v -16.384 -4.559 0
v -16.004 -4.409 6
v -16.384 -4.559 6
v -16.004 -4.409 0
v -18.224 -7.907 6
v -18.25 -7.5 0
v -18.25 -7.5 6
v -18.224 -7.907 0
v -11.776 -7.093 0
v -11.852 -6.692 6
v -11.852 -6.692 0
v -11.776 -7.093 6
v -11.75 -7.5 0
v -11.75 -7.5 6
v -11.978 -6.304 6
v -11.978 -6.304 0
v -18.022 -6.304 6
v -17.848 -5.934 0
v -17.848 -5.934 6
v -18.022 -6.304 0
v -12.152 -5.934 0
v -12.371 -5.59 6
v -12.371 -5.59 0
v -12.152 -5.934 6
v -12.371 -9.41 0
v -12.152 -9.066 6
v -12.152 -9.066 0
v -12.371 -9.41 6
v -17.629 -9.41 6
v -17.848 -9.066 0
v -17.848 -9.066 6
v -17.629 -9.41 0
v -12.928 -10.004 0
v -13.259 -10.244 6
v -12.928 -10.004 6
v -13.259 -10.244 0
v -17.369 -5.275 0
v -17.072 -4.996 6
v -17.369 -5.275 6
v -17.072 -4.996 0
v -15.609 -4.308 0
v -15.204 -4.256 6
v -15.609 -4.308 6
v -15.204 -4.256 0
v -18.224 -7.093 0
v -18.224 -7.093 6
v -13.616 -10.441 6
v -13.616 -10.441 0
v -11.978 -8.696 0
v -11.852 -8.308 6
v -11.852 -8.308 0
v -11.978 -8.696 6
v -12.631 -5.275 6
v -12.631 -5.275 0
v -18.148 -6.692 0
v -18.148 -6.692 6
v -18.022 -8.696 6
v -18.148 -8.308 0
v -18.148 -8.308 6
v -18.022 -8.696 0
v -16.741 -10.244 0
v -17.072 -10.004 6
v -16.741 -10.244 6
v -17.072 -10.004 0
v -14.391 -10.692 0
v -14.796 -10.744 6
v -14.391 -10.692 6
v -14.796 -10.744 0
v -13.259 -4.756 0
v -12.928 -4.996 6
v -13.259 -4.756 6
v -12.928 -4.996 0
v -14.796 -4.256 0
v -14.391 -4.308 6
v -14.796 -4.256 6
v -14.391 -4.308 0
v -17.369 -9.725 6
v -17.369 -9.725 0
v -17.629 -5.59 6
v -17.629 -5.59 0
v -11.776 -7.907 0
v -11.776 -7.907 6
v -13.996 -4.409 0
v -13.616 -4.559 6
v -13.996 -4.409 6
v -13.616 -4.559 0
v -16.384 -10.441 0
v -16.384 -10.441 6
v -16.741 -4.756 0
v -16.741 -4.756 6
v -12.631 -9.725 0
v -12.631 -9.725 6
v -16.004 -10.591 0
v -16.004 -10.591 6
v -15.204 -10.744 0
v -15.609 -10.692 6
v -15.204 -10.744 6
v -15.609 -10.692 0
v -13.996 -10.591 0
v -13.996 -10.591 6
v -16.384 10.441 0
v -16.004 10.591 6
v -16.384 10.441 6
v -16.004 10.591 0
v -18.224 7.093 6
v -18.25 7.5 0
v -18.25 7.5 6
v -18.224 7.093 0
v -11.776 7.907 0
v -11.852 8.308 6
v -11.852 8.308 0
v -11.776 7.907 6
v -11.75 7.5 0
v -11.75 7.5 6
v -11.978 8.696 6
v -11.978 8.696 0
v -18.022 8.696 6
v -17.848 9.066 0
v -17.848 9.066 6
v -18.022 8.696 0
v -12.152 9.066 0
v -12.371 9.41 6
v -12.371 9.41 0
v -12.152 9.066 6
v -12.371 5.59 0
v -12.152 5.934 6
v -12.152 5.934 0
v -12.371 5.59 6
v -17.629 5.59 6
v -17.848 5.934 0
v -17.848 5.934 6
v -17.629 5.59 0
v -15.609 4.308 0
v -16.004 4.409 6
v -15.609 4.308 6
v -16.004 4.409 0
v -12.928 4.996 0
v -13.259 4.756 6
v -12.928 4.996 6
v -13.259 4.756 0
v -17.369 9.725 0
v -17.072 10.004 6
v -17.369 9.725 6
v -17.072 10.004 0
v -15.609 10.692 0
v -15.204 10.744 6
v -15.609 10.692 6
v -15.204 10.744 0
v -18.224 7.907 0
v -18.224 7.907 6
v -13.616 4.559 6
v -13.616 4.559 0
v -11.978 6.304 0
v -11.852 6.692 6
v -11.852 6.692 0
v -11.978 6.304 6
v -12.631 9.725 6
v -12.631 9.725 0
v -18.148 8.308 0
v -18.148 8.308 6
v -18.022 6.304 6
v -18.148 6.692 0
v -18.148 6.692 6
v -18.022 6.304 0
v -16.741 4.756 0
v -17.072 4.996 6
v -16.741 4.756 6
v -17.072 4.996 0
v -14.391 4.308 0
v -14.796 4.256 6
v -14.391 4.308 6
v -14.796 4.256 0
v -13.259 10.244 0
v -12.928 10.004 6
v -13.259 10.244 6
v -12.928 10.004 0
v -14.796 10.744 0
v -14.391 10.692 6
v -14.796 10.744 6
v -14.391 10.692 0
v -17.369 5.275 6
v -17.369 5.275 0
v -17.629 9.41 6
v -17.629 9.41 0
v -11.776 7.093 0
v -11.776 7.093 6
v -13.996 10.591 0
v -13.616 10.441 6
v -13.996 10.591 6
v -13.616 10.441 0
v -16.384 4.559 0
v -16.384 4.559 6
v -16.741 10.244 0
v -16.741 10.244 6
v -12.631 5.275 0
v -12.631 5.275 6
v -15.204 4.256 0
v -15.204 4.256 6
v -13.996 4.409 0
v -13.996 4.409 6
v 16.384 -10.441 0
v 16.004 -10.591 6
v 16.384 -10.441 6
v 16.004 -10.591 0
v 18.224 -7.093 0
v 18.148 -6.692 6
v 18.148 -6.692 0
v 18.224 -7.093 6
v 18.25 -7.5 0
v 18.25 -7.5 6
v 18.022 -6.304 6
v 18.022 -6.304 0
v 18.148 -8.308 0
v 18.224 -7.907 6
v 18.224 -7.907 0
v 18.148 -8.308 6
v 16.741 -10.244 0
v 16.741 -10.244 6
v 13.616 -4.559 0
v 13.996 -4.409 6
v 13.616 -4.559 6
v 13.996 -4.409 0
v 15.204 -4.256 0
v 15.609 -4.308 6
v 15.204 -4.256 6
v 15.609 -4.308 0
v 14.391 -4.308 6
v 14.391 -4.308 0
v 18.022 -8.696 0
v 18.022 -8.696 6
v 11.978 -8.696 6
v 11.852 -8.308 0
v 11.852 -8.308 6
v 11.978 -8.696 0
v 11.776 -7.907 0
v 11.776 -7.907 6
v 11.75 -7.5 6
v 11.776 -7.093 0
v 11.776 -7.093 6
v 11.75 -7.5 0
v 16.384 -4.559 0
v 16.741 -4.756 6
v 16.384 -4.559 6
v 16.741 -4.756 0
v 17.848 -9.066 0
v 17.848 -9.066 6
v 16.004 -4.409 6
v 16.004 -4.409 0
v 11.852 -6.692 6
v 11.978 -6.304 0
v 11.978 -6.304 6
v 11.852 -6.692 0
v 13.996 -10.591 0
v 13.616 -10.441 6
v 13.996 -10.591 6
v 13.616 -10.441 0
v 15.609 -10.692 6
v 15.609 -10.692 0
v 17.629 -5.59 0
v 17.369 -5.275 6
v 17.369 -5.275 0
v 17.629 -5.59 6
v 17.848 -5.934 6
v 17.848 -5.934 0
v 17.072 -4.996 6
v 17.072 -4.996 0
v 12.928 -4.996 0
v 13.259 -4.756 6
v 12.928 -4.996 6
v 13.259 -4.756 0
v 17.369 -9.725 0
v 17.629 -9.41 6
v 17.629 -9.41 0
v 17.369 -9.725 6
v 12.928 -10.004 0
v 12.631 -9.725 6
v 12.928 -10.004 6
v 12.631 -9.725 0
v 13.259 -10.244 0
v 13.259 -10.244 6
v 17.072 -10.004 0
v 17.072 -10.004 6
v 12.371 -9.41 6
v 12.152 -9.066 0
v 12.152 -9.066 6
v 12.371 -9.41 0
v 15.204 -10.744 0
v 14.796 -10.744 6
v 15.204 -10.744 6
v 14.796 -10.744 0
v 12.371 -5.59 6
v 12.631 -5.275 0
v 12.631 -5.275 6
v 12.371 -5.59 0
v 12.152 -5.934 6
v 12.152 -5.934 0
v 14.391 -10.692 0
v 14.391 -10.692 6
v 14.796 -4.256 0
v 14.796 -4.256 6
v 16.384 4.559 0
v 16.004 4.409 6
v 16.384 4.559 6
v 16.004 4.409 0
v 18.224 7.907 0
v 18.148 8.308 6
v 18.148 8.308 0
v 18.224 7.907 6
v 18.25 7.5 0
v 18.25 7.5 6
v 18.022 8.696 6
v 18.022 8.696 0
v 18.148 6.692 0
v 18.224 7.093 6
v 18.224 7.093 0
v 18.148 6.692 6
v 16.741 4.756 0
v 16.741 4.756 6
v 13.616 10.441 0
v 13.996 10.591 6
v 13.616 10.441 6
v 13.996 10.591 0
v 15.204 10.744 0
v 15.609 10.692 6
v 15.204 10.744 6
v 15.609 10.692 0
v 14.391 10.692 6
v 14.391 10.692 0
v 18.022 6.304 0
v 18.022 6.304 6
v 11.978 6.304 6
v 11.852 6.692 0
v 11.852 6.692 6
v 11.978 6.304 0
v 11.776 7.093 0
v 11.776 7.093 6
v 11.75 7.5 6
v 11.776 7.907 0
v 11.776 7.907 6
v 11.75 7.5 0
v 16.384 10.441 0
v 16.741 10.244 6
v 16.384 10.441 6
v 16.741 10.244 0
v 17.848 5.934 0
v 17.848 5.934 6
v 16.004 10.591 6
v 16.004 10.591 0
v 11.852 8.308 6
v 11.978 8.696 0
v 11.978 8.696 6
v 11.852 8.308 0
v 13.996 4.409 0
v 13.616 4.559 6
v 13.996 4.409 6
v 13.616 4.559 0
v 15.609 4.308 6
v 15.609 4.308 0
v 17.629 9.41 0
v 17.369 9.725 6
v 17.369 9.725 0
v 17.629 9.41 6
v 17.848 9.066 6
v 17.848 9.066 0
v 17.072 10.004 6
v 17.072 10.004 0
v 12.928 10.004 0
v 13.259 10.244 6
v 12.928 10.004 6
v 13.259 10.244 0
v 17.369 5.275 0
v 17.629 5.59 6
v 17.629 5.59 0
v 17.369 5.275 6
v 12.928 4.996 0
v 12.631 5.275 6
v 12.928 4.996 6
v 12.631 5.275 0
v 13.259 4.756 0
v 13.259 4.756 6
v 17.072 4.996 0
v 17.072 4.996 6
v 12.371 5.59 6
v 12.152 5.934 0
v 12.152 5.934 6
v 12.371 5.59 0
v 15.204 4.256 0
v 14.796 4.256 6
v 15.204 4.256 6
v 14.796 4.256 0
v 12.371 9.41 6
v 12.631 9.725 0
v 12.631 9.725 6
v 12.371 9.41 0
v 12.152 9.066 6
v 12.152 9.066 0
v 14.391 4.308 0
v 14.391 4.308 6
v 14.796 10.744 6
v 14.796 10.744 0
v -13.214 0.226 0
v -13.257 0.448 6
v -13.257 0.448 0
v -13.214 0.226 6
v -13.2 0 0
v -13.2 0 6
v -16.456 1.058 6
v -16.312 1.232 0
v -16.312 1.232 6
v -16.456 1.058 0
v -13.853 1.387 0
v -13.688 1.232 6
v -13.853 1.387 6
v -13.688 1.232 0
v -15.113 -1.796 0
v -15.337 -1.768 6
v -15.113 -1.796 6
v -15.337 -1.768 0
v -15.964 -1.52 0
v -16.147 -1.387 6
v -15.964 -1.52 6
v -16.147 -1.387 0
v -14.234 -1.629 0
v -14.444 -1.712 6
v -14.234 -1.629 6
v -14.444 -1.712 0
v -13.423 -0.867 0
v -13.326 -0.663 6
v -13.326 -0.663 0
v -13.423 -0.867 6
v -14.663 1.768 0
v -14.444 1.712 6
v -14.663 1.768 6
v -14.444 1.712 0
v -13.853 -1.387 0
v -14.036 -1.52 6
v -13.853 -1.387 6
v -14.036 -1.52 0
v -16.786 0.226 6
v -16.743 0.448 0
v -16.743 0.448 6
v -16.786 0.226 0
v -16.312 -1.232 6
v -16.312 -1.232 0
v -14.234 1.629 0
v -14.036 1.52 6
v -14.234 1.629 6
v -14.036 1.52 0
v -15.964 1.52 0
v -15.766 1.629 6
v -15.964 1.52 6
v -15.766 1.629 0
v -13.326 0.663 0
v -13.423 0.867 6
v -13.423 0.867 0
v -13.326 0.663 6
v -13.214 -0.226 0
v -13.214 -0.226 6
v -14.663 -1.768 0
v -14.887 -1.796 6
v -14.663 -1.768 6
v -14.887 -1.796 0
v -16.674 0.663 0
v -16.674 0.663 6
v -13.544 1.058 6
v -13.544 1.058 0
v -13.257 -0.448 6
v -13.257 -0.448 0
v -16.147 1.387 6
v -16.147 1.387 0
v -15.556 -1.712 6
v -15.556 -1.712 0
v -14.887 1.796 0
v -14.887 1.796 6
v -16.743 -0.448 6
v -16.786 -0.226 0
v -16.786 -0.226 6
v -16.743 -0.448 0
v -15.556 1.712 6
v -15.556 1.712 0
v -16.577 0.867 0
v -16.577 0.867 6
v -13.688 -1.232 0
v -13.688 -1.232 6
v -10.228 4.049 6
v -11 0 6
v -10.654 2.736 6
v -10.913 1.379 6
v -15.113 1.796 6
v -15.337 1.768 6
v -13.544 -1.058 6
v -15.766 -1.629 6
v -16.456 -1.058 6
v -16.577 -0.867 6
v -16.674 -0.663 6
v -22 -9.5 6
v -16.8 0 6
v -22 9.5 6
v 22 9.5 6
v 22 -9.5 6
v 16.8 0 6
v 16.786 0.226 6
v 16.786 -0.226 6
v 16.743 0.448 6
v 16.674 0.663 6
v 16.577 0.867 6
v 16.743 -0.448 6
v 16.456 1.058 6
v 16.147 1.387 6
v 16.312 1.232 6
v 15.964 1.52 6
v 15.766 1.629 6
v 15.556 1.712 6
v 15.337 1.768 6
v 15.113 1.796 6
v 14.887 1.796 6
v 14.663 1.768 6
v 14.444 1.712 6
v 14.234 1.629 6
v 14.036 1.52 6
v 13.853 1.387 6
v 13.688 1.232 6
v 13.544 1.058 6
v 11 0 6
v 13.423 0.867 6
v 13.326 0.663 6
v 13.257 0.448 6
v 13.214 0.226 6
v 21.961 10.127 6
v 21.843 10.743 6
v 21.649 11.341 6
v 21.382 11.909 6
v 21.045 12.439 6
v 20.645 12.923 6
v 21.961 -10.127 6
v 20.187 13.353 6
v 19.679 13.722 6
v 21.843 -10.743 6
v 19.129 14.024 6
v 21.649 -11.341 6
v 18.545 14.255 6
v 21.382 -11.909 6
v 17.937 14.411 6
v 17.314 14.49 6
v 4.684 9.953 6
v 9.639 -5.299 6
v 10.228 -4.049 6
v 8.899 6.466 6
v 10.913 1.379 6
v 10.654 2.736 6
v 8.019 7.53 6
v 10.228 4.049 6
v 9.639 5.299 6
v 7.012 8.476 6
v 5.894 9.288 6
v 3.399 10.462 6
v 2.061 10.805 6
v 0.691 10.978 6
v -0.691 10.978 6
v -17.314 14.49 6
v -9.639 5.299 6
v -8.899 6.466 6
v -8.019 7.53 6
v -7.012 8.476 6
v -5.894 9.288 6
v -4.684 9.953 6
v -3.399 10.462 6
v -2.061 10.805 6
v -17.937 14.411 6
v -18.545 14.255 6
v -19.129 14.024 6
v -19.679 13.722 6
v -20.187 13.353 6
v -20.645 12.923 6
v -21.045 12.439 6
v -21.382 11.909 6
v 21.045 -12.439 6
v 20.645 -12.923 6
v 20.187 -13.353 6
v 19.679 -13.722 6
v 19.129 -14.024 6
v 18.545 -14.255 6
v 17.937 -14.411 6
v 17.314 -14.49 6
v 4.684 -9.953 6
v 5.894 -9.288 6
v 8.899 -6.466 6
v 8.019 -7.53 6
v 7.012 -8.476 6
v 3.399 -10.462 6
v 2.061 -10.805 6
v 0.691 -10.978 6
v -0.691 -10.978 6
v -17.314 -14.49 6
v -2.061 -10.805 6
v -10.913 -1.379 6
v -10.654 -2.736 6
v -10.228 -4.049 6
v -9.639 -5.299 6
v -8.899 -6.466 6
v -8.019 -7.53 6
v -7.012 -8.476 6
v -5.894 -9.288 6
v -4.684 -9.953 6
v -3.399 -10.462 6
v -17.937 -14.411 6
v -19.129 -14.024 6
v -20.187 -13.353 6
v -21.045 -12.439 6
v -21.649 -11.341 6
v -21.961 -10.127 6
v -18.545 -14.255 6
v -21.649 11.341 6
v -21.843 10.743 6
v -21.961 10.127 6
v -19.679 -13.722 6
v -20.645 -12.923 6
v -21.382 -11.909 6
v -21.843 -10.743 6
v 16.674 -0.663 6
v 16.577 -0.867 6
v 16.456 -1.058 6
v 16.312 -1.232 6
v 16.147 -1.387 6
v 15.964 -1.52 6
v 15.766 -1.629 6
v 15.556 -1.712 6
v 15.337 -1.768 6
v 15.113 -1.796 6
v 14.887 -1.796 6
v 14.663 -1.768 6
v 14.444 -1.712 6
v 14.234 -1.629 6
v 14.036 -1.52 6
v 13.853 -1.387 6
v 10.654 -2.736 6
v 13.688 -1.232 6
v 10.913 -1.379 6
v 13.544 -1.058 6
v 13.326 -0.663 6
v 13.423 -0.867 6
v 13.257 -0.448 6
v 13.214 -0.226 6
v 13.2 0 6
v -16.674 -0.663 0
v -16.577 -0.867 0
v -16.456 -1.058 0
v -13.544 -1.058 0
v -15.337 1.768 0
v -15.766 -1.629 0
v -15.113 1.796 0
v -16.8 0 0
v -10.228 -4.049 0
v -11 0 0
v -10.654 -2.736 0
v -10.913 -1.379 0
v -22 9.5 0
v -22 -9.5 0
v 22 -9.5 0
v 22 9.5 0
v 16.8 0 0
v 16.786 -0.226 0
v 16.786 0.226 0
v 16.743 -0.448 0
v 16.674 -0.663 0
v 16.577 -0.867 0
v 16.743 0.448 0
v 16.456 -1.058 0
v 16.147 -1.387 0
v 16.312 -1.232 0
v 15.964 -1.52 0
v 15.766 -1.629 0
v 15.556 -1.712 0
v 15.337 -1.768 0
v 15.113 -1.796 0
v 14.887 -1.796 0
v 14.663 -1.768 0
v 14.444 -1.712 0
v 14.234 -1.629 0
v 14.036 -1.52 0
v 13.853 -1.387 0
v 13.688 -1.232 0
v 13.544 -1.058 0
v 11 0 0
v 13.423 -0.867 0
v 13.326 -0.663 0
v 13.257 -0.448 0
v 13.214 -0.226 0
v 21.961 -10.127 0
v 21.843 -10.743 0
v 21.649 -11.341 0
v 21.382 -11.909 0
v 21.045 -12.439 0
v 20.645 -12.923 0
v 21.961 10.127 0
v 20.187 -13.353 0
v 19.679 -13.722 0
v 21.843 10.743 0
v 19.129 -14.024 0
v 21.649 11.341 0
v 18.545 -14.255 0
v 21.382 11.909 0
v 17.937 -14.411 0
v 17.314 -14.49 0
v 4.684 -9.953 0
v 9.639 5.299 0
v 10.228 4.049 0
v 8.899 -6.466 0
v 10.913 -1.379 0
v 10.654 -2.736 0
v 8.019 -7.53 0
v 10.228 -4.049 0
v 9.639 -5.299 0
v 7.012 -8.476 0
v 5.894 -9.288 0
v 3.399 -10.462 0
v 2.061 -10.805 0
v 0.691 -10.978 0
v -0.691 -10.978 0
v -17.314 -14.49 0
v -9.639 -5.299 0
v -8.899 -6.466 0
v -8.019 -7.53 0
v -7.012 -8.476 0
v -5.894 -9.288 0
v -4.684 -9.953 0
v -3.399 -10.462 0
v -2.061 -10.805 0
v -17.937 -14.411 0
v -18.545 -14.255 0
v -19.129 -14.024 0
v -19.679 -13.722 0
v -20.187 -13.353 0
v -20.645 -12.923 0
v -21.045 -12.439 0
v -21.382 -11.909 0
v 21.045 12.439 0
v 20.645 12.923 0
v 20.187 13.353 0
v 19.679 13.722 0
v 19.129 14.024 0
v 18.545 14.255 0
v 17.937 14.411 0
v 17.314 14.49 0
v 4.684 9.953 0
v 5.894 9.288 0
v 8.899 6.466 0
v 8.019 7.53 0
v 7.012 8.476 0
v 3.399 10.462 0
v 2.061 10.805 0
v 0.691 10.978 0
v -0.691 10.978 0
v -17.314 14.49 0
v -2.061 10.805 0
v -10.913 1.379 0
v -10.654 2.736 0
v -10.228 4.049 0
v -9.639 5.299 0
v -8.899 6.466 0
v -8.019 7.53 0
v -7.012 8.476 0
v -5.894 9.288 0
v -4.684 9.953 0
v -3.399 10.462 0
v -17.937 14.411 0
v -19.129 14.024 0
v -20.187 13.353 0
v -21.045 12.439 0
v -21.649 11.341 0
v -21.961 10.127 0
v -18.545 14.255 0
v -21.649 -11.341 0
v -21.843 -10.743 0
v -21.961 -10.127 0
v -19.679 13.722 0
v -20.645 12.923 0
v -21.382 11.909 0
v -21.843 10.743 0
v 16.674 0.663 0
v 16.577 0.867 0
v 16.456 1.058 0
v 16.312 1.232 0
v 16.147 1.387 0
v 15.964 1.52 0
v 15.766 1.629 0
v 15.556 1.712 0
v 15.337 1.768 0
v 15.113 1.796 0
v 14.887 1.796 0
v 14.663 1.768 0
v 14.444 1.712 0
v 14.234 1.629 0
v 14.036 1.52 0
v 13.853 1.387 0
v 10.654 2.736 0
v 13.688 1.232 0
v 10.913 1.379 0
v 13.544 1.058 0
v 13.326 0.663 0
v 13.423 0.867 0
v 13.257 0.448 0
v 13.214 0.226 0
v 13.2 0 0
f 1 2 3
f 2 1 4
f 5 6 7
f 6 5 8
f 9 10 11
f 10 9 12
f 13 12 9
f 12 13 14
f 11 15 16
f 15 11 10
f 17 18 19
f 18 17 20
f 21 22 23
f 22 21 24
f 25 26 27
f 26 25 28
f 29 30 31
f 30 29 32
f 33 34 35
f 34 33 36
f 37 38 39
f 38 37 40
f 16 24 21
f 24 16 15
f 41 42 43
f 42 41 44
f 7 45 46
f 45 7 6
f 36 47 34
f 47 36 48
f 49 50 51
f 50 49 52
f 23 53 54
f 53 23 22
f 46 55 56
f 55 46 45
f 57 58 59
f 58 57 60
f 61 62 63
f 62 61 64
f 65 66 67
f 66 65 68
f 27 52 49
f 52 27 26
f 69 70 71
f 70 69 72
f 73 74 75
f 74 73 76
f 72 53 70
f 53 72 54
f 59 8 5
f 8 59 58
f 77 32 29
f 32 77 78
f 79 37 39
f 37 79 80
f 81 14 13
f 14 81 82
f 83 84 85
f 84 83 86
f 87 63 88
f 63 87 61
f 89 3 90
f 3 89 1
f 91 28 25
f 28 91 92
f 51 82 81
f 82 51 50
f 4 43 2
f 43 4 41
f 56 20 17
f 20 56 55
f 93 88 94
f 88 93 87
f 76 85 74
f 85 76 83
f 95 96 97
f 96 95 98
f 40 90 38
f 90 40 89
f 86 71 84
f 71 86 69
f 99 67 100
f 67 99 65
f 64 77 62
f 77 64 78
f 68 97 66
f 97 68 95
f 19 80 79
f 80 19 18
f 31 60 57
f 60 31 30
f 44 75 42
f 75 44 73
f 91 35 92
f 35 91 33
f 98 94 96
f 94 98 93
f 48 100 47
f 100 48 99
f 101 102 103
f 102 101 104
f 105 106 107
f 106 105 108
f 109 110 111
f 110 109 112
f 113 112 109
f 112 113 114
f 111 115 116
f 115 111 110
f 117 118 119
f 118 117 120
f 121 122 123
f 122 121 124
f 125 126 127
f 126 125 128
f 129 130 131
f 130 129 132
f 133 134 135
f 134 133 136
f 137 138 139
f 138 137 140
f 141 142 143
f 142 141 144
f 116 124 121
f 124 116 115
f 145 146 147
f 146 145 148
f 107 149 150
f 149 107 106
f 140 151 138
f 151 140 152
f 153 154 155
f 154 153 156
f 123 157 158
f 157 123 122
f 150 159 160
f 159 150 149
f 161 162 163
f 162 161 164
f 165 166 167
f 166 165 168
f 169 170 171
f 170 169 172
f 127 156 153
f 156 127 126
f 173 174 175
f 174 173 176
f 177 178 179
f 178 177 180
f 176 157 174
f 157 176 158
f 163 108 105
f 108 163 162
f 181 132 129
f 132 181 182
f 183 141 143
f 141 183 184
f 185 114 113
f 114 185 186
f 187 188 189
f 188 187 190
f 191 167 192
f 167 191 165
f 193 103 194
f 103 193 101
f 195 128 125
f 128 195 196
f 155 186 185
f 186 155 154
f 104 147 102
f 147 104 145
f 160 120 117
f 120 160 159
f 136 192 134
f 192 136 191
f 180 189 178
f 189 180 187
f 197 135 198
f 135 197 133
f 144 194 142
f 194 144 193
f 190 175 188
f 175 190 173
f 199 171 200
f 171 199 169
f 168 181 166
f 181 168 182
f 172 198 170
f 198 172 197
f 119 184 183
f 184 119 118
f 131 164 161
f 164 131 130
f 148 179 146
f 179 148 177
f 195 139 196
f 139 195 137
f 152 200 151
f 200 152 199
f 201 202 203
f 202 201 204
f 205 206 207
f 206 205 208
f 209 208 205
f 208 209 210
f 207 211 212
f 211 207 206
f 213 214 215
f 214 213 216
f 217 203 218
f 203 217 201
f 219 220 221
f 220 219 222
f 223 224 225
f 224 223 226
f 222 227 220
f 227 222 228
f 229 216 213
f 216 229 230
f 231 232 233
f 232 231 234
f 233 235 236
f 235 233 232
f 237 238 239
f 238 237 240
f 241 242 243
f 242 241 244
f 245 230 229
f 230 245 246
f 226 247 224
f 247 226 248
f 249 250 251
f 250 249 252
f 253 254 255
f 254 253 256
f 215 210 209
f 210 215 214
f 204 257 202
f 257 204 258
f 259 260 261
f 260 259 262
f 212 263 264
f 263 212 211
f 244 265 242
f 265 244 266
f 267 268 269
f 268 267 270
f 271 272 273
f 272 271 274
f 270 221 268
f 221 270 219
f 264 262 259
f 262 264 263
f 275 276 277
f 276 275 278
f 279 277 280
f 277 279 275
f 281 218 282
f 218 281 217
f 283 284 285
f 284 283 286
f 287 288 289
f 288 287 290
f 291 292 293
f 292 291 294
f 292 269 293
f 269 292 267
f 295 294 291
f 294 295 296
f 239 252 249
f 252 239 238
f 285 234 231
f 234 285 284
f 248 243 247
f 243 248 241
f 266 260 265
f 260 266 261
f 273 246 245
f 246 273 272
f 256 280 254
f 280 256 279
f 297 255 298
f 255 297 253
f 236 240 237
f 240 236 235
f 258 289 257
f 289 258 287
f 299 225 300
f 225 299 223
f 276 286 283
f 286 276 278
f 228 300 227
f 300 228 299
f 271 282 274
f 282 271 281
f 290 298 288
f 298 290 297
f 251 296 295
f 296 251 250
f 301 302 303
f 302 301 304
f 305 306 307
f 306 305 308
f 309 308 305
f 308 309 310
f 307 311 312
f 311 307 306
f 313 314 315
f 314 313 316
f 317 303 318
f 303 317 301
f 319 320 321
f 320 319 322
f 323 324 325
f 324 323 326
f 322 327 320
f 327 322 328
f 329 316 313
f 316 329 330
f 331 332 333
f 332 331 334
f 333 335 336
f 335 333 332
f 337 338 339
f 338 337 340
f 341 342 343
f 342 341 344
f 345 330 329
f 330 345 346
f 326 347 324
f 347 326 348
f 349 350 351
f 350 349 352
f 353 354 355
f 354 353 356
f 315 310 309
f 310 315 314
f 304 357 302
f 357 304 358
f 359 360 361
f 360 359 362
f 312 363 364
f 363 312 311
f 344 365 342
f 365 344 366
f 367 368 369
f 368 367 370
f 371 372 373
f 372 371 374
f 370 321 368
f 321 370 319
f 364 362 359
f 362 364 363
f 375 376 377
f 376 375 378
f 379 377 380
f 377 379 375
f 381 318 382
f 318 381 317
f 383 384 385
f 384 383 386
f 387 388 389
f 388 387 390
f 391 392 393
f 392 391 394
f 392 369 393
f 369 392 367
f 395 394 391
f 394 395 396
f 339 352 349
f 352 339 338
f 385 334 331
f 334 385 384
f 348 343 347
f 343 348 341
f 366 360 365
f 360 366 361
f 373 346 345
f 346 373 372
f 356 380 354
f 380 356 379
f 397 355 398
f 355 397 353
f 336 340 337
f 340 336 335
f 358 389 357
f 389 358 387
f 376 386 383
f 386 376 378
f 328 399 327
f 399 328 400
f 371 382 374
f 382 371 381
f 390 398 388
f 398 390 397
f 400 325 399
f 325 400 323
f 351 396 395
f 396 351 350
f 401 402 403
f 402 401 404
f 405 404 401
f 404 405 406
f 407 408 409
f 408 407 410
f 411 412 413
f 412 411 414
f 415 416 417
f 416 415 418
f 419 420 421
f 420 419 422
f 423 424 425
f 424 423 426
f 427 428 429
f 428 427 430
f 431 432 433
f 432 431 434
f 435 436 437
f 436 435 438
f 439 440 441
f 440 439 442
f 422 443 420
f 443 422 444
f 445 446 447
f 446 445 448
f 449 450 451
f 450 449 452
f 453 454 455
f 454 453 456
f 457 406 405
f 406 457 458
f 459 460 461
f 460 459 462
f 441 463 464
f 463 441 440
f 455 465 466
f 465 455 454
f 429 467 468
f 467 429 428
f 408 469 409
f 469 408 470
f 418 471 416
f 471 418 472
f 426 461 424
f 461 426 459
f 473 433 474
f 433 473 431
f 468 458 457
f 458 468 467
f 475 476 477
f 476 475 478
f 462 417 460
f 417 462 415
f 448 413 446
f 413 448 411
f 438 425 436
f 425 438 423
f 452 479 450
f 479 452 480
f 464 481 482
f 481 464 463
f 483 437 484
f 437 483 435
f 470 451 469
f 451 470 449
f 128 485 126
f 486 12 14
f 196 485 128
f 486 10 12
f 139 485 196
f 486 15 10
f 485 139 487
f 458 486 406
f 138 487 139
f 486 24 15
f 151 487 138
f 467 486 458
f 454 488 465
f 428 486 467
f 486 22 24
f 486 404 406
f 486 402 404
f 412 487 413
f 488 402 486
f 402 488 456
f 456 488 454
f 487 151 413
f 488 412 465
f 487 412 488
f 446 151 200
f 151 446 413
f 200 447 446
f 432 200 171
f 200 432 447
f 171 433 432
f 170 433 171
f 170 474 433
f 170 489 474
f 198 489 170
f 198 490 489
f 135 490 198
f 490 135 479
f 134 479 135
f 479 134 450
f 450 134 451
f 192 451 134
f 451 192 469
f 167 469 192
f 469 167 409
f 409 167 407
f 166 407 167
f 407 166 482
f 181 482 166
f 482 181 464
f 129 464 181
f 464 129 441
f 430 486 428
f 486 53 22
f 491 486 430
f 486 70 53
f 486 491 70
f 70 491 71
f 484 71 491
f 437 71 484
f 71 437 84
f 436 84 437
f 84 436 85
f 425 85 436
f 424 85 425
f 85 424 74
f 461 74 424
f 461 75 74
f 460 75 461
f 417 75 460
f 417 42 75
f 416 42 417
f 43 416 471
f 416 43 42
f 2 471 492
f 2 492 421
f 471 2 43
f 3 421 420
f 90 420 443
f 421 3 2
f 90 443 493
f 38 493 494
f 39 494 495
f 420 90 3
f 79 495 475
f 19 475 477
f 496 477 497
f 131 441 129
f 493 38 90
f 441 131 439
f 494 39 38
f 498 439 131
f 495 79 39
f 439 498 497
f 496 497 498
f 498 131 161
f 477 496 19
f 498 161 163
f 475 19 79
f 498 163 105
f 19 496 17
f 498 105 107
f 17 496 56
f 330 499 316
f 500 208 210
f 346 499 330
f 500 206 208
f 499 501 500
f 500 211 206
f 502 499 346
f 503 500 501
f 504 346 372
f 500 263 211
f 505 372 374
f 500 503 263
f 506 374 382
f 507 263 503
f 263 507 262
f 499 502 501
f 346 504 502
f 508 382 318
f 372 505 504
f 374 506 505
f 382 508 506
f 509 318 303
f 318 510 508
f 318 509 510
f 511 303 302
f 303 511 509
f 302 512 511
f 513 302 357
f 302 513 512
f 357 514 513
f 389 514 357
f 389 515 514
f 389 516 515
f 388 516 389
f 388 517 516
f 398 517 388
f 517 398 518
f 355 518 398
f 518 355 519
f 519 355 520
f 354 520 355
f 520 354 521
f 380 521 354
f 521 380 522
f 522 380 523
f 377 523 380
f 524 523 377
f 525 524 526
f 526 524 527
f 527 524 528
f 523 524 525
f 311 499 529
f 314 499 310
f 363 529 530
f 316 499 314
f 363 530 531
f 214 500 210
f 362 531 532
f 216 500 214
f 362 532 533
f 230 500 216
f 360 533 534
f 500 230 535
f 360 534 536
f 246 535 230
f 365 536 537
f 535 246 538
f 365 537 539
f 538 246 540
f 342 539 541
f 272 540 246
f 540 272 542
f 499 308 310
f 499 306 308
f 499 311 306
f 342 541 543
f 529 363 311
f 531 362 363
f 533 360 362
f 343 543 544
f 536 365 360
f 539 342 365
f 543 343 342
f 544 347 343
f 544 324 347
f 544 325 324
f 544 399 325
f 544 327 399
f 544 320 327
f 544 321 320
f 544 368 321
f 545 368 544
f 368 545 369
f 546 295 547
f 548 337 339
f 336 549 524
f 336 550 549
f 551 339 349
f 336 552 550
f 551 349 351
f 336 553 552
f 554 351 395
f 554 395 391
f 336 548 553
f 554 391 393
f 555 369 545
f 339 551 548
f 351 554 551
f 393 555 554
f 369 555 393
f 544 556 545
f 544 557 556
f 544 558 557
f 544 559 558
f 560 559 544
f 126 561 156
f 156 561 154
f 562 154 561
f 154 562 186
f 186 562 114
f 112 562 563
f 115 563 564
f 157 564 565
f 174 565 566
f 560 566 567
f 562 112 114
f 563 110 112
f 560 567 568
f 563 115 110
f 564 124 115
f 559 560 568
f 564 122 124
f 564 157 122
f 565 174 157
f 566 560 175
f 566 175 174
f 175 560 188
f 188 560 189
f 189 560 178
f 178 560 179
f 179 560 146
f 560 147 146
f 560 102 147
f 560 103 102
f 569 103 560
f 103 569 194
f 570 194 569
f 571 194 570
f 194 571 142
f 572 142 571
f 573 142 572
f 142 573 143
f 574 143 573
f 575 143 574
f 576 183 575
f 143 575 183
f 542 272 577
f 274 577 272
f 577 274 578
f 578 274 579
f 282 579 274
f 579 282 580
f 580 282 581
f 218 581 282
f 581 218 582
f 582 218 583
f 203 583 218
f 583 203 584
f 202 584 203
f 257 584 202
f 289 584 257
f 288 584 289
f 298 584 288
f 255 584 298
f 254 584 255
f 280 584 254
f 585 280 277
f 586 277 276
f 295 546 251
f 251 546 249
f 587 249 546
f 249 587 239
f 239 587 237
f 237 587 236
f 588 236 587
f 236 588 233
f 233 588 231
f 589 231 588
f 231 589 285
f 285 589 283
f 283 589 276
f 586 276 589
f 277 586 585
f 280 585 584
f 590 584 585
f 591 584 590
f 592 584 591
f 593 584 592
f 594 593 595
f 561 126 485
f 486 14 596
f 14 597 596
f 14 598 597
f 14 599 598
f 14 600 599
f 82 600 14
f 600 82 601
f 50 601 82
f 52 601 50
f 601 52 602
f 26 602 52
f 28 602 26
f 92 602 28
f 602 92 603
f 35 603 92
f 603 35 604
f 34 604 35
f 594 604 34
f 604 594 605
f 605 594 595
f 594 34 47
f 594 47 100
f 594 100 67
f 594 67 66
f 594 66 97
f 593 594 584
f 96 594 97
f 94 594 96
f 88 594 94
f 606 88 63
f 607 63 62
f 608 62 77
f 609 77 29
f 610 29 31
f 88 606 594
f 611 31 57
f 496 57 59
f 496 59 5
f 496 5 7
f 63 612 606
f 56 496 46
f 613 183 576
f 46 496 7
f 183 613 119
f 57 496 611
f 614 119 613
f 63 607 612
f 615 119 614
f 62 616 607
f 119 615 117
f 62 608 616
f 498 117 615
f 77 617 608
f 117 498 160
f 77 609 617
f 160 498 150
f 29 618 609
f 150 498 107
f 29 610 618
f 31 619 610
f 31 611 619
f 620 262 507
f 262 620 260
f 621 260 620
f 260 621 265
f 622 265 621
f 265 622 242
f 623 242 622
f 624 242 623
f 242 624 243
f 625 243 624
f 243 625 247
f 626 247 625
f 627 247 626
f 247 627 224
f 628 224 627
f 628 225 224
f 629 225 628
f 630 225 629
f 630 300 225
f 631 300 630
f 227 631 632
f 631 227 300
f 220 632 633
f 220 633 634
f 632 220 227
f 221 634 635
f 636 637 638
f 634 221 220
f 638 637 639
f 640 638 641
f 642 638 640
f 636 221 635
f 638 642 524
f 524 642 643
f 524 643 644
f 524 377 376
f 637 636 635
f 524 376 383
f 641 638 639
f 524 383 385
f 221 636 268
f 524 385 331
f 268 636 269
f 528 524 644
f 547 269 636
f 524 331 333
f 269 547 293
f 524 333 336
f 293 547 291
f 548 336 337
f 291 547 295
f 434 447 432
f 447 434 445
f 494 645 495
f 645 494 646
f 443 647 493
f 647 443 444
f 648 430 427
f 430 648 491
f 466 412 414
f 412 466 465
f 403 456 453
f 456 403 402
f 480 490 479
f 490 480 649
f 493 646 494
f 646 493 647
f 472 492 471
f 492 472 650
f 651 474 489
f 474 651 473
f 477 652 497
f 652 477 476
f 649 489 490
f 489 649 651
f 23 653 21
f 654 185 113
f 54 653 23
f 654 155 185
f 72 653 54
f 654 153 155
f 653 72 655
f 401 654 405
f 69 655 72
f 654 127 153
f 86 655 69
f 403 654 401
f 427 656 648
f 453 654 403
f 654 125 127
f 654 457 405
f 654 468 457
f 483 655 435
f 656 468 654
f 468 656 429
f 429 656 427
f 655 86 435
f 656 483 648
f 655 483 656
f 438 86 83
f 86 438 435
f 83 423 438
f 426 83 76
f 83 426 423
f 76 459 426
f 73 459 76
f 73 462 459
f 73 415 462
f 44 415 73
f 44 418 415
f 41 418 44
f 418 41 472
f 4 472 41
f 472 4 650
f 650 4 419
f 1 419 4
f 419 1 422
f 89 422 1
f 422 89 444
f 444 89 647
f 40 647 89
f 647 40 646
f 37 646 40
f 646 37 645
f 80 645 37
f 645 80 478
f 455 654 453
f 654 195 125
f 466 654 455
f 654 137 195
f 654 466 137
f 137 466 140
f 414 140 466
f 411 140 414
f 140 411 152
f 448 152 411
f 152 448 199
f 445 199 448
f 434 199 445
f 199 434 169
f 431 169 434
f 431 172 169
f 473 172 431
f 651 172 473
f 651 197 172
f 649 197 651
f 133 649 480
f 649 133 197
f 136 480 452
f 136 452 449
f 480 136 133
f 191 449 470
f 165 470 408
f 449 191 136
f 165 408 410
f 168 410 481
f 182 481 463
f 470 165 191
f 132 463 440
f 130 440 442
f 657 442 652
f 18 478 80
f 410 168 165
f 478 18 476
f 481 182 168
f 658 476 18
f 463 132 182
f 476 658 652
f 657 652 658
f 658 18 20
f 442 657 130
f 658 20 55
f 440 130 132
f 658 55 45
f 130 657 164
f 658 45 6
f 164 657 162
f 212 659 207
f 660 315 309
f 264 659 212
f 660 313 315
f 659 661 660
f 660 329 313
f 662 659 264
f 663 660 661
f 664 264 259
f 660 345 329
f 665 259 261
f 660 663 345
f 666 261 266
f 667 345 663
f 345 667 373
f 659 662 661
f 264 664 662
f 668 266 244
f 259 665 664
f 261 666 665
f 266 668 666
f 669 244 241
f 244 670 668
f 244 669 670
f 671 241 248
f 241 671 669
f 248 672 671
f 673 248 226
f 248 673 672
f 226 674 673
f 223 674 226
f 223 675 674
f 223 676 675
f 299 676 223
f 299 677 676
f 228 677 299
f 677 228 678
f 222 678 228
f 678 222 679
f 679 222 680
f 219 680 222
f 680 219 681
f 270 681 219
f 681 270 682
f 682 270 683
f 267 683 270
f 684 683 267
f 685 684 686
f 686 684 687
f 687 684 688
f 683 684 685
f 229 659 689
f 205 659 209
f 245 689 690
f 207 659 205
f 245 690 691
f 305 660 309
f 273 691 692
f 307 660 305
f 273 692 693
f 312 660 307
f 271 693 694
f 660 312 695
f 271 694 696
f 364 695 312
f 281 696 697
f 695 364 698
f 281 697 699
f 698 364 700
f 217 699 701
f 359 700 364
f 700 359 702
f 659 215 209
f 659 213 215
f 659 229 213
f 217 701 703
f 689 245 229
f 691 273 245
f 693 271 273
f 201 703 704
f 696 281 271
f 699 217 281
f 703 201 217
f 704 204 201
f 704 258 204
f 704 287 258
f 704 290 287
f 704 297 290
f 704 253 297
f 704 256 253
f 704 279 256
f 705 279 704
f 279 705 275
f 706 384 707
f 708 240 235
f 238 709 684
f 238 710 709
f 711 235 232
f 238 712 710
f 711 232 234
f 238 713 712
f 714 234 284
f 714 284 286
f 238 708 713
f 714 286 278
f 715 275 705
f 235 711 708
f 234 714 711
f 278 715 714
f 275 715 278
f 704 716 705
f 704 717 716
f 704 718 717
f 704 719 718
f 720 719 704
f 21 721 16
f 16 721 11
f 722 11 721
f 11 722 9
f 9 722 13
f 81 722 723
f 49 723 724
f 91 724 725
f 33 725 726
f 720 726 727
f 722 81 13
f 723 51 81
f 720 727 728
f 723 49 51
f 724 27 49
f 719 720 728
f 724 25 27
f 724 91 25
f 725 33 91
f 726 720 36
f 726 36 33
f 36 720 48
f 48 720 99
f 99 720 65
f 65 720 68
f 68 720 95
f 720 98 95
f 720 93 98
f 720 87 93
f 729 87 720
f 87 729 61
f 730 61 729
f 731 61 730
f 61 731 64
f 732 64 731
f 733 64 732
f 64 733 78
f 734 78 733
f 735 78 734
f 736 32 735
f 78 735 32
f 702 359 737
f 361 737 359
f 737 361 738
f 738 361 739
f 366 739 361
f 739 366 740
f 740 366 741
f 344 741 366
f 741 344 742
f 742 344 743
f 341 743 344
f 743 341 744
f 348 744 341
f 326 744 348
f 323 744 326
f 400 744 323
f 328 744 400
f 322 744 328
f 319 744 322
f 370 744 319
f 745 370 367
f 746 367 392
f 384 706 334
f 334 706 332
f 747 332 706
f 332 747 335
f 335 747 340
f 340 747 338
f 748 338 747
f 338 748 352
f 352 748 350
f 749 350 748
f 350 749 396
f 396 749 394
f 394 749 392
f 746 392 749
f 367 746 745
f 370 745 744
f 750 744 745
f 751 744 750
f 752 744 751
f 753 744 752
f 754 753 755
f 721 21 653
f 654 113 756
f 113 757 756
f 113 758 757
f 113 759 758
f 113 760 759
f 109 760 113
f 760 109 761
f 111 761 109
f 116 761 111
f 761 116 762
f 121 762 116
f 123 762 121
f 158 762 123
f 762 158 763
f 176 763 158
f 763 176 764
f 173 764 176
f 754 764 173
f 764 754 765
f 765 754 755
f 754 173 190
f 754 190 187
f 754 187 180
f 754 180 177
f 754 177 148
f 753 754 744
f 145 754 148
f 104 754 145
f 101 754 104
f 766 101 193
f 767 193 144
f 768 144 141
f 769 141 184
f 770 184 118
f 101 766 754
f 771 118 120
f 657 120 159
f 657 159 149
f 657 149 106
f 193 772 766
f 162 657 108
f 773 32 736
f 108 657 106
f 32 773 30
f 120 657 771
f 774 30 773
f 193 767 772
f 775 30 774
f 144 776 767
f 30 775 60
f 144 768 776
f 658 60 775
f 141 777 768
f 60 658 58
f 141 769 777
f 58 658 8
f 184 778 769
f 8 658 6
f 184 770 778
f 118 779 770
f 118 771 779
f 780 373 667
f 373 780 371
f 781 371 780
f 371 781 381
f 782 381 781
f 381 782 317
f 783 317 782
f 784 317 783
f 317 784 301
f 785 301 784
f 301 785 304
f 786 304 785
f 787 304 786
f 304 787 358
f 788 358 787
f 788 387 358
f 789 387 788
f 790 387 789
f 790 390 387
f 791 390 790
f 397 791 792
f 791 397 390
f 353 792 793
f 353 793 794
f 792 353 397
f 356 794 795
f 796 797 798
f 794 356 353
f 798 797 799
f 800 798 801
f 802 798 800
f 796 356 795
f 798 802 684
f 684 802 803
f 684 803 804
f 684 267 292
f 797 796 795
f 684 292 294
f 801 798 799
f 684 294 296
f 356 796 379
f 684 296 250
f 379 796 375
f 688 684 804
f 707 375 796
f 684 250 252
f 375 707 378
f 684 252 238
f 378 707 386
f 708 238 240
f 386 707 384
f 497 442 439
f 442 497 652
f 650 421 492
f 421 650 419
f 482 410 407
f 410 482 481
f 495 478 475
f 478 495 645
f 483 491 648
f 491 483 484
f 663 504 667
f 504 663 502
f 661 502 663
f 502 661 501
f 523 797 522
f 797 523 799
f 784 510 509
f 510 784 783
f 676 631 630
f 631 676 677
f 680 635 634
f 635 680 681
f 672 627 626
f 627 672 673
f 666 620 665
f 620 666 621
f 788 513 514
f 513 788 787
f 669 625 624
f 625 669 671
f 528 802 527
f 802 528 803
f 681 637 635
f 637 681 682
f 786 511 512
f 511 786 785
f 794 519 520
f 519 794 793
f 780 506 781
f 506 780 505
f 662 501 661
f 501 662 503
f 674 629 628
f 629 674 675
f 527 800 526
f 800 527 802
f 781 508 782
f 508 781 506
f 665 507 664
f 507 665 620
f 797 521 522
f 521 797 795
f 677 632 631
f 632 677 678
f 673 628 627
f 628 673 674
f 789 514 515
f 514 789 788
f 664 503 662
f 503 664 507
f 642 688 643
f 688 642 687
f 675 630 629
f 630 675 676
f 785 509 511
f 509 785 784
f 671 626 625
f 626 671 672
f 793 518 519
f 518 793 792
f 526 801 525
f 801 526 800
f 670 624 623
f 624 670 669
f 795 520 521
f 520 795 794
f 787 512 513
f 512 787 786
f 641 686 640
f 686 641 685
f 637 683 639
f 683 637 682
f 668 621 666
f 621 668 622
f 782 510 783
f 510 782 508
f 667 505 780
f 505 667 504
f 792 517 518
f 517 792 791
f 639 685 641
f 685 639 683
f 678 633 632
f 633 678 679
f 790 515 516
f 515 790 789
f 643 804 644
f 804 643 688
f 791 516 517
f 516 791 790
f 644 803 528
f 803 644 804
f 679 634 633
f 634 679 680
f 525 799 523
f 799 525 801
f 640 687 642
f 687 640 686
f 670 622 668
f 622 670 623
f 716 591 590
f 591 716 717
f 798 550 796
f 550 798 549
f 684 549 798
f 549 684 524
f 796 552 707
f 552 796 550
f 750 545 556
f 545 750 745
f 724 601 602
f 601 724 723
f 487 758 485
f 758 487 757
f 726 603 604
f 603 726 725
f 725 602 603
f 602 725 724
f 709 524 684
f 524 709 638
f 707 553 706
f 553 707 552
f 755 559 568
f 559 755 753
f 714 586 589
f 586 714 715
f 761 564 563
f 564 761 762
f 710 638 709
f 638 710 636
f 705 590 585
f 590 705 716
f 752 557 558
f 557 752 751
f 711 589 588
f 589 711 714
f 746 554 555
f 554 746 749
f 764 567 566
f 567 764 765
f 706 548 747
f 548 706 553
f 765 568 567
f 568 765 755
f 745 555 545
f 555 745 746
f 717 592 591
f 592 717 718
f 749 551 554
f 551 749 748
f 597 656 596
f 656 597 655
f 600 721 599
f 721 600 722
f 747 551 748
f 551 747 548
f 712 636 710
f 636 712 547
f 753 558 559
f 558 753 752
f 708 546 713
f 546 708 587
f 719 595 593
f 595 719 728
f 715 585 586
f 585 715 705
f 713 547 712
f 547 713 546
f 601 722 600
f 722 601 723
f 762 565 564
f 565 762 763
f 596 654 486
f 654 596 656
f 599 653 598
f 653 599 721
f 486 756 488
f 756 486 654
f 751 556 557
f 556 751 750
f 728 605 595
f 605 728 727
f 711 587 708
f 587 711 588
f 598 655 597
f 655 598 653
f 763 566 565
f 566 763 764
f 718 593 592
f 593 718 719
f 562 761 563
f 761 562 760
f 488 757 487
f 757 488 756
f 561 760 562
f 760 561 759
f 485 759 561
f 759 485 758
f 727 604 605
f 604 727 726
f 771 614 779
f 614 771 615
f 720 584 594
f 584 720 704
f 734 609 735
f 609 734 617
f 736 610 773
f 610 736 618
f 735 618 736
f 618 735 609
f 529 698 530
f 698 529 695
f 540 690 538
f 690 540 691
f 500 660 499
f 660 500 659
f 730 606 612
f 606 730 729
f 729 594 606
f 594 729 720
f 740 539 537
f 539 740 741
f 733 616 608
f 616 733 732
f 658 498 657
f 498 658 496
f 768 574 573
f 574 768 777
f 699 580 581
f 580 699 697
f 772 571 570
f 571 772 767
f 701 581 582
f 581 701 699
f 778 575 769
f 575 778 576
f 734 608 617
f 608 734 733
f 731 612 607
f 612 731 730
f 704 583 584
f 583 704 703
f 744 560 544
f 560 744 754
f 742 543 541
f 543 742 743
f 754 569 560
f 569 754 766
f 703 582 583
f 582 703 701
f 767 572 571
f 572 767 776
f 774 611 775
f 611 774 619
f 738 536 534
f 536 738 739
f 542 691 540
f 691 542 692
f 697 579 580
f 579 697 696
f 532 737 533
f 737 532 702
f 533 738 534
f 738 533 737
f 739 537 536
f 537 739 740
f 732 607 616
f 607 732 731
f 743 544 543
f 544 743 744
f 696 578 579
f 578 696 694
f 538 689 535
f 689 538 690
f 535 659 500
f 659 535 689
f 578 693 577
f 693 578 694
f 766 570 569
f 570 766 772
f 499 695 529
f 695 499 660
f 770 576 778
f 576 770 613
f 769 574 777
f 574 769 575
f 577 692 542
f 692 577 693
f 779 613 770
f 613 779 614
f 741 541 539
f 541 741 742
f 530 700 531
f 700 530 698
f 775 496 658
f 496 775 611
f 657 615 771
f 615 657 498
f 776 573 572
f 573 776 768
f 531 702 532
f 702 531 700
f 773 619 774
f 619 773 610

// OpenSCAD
$fn = 50;


difference() {
	union() {
		hull() {
			translate(v = [-17.0000000000, 9.5000000000, 0]) {
				cylinder(h = 6, r = 5);
			}
			translate(v = [17.0000000000, 9.5000000000, 0]) {
				cylinder(h = 6, r = 5);
			}
			translate(v = [-17.0000000000, -9.5000000000, 0]) {
				cylinder(h = 6, r = 5);
			}
			translate(v = [17.0000000000, -9.5000000000, 0]) {
				cylinder(h = 6, r = 5);
			}
		}
	}
	union() {
		#translate(v = [-15.0000000000, -7.5000000000, 0]) {
			cylinder(h = 6, r = 3.2500000000);
		}
		#translate(v = [-15.0000000000, 7.5000000000, 0]) {
			cylinder(h = 6, r = 3.2500000000);
		}
		#translate(v = [15.0000000000, -7.5000000000, 0]) {
			cylinder(h = 6, r = 3.2500000000);
		}
		#translate(v = [15.0000000000, 7.5000000000, 0]) {
			cylinder(h = 6, r = 3.2500000000);
		}
		#translate(v = [-15.0000000000, -7.5000000000, -100.0000000000]) {
			cylinder(h = 200, r = 3.2500000000);
		}
		#translate(v = [-15.0000000000, 7.5000000000, -100.0000000000]) {
			cylinder(h = 200, r = 3.2500000000);
		}
		#translate(v = [15.0000000000, -7.5000000000, -100.0000000000]) {
			cylinder(h = 200, r = 3.2500000000);
		}
		#translate(v = [15.0000000000, 7.5000000000, -100.0000000000]) {
			cylinder(h = 200, r = 3.2500000000);
		}
		#translate(v = [-15.0000000000, -7.5000000000, 0]) {
			cylinder(h = 6, r = 1.8000000000);
		}
		#translate(v = [-15.0000000000, 0.0000000000, 0]) {
			cylinder(h = 6, r = 1.8000000000);
		}
		#translate(v = [-15.0000000000, 7.5000000000, 0]) {
			cylinder(h = 6, r = 1.8000000000);
		}
		#translate(v = [15.0000000000, -7.5000000000, 0]) {
			cylinder(h = 6, r = 1.8000000000);
		}
		#translate(v = [15.0000000000, 0.0000000000, 0]) {
			cylinder(h = 6, r = 1.8000000000);
		}
		#translate(v = [15.0000000000, 7.5000000000, 0]) {
			cylinder(h = 6, r = 1.8000000000);
		}
		#translate(v = [-15.0000000000, -7.5000000000, 0]) {
			cylinder(h = 6, r = 1.8000000000);
		}
		#translate(v = [-15.0000000000, 0.0000000000, 0]) {
			cylinder(h = 6, r = 1.8000000000);
		}
		#translate(v = [-15.0000000000, 7.5000000000, 0]) {
			cylinder(h = 6, r = 1.8000000000);
		}
		#translate(v = [15.0000000000, -7.5000000000, 0]) {
			cylinder(h = 6, r = 1.8000000000);
		}
		#translate(v = [15.0000000000, 0.0000000000, 0]) {
			cylinder(h = 6, r = 1.8000000000);
		}
		#translate(v = [15.0000000000, 7.5000000000, 0]) {
			cylinder(h = 6, r = 1.8000000000);
		}
		#translate(v = [-15.0000000000, -7.5000000000, 0]) {
			cylinder(h = 6, r = 1.8000000000);
		}
		#translate(v = [-15.0000000000, 0.0000000000, 0]) {
			cylinder(h = 6, r = 1.8000000000);
		}
		#translate(v = [-15.0000000000, 7.5000000000, 0]) {
			cylinder(h = 6, r = 1.8000000000);
		}
		#translate(v = [15.0000000000, -7.5000000000, 0]) {
			cylinder(h = 6, r = 1.8000000000);
		}
		#translate(v = [15.0000000000, 0.0000000000, 0]) {
			cylinder(h = 6, r = 1.8000000000);
		}
		#translate(v = [15.0000000000, 7.5000000000, 0]) {
			cylinder(h = 6, r = 1.8000000000);
		}
		#cylinder(h = 6, r = 11.0000000000);
	}
}
